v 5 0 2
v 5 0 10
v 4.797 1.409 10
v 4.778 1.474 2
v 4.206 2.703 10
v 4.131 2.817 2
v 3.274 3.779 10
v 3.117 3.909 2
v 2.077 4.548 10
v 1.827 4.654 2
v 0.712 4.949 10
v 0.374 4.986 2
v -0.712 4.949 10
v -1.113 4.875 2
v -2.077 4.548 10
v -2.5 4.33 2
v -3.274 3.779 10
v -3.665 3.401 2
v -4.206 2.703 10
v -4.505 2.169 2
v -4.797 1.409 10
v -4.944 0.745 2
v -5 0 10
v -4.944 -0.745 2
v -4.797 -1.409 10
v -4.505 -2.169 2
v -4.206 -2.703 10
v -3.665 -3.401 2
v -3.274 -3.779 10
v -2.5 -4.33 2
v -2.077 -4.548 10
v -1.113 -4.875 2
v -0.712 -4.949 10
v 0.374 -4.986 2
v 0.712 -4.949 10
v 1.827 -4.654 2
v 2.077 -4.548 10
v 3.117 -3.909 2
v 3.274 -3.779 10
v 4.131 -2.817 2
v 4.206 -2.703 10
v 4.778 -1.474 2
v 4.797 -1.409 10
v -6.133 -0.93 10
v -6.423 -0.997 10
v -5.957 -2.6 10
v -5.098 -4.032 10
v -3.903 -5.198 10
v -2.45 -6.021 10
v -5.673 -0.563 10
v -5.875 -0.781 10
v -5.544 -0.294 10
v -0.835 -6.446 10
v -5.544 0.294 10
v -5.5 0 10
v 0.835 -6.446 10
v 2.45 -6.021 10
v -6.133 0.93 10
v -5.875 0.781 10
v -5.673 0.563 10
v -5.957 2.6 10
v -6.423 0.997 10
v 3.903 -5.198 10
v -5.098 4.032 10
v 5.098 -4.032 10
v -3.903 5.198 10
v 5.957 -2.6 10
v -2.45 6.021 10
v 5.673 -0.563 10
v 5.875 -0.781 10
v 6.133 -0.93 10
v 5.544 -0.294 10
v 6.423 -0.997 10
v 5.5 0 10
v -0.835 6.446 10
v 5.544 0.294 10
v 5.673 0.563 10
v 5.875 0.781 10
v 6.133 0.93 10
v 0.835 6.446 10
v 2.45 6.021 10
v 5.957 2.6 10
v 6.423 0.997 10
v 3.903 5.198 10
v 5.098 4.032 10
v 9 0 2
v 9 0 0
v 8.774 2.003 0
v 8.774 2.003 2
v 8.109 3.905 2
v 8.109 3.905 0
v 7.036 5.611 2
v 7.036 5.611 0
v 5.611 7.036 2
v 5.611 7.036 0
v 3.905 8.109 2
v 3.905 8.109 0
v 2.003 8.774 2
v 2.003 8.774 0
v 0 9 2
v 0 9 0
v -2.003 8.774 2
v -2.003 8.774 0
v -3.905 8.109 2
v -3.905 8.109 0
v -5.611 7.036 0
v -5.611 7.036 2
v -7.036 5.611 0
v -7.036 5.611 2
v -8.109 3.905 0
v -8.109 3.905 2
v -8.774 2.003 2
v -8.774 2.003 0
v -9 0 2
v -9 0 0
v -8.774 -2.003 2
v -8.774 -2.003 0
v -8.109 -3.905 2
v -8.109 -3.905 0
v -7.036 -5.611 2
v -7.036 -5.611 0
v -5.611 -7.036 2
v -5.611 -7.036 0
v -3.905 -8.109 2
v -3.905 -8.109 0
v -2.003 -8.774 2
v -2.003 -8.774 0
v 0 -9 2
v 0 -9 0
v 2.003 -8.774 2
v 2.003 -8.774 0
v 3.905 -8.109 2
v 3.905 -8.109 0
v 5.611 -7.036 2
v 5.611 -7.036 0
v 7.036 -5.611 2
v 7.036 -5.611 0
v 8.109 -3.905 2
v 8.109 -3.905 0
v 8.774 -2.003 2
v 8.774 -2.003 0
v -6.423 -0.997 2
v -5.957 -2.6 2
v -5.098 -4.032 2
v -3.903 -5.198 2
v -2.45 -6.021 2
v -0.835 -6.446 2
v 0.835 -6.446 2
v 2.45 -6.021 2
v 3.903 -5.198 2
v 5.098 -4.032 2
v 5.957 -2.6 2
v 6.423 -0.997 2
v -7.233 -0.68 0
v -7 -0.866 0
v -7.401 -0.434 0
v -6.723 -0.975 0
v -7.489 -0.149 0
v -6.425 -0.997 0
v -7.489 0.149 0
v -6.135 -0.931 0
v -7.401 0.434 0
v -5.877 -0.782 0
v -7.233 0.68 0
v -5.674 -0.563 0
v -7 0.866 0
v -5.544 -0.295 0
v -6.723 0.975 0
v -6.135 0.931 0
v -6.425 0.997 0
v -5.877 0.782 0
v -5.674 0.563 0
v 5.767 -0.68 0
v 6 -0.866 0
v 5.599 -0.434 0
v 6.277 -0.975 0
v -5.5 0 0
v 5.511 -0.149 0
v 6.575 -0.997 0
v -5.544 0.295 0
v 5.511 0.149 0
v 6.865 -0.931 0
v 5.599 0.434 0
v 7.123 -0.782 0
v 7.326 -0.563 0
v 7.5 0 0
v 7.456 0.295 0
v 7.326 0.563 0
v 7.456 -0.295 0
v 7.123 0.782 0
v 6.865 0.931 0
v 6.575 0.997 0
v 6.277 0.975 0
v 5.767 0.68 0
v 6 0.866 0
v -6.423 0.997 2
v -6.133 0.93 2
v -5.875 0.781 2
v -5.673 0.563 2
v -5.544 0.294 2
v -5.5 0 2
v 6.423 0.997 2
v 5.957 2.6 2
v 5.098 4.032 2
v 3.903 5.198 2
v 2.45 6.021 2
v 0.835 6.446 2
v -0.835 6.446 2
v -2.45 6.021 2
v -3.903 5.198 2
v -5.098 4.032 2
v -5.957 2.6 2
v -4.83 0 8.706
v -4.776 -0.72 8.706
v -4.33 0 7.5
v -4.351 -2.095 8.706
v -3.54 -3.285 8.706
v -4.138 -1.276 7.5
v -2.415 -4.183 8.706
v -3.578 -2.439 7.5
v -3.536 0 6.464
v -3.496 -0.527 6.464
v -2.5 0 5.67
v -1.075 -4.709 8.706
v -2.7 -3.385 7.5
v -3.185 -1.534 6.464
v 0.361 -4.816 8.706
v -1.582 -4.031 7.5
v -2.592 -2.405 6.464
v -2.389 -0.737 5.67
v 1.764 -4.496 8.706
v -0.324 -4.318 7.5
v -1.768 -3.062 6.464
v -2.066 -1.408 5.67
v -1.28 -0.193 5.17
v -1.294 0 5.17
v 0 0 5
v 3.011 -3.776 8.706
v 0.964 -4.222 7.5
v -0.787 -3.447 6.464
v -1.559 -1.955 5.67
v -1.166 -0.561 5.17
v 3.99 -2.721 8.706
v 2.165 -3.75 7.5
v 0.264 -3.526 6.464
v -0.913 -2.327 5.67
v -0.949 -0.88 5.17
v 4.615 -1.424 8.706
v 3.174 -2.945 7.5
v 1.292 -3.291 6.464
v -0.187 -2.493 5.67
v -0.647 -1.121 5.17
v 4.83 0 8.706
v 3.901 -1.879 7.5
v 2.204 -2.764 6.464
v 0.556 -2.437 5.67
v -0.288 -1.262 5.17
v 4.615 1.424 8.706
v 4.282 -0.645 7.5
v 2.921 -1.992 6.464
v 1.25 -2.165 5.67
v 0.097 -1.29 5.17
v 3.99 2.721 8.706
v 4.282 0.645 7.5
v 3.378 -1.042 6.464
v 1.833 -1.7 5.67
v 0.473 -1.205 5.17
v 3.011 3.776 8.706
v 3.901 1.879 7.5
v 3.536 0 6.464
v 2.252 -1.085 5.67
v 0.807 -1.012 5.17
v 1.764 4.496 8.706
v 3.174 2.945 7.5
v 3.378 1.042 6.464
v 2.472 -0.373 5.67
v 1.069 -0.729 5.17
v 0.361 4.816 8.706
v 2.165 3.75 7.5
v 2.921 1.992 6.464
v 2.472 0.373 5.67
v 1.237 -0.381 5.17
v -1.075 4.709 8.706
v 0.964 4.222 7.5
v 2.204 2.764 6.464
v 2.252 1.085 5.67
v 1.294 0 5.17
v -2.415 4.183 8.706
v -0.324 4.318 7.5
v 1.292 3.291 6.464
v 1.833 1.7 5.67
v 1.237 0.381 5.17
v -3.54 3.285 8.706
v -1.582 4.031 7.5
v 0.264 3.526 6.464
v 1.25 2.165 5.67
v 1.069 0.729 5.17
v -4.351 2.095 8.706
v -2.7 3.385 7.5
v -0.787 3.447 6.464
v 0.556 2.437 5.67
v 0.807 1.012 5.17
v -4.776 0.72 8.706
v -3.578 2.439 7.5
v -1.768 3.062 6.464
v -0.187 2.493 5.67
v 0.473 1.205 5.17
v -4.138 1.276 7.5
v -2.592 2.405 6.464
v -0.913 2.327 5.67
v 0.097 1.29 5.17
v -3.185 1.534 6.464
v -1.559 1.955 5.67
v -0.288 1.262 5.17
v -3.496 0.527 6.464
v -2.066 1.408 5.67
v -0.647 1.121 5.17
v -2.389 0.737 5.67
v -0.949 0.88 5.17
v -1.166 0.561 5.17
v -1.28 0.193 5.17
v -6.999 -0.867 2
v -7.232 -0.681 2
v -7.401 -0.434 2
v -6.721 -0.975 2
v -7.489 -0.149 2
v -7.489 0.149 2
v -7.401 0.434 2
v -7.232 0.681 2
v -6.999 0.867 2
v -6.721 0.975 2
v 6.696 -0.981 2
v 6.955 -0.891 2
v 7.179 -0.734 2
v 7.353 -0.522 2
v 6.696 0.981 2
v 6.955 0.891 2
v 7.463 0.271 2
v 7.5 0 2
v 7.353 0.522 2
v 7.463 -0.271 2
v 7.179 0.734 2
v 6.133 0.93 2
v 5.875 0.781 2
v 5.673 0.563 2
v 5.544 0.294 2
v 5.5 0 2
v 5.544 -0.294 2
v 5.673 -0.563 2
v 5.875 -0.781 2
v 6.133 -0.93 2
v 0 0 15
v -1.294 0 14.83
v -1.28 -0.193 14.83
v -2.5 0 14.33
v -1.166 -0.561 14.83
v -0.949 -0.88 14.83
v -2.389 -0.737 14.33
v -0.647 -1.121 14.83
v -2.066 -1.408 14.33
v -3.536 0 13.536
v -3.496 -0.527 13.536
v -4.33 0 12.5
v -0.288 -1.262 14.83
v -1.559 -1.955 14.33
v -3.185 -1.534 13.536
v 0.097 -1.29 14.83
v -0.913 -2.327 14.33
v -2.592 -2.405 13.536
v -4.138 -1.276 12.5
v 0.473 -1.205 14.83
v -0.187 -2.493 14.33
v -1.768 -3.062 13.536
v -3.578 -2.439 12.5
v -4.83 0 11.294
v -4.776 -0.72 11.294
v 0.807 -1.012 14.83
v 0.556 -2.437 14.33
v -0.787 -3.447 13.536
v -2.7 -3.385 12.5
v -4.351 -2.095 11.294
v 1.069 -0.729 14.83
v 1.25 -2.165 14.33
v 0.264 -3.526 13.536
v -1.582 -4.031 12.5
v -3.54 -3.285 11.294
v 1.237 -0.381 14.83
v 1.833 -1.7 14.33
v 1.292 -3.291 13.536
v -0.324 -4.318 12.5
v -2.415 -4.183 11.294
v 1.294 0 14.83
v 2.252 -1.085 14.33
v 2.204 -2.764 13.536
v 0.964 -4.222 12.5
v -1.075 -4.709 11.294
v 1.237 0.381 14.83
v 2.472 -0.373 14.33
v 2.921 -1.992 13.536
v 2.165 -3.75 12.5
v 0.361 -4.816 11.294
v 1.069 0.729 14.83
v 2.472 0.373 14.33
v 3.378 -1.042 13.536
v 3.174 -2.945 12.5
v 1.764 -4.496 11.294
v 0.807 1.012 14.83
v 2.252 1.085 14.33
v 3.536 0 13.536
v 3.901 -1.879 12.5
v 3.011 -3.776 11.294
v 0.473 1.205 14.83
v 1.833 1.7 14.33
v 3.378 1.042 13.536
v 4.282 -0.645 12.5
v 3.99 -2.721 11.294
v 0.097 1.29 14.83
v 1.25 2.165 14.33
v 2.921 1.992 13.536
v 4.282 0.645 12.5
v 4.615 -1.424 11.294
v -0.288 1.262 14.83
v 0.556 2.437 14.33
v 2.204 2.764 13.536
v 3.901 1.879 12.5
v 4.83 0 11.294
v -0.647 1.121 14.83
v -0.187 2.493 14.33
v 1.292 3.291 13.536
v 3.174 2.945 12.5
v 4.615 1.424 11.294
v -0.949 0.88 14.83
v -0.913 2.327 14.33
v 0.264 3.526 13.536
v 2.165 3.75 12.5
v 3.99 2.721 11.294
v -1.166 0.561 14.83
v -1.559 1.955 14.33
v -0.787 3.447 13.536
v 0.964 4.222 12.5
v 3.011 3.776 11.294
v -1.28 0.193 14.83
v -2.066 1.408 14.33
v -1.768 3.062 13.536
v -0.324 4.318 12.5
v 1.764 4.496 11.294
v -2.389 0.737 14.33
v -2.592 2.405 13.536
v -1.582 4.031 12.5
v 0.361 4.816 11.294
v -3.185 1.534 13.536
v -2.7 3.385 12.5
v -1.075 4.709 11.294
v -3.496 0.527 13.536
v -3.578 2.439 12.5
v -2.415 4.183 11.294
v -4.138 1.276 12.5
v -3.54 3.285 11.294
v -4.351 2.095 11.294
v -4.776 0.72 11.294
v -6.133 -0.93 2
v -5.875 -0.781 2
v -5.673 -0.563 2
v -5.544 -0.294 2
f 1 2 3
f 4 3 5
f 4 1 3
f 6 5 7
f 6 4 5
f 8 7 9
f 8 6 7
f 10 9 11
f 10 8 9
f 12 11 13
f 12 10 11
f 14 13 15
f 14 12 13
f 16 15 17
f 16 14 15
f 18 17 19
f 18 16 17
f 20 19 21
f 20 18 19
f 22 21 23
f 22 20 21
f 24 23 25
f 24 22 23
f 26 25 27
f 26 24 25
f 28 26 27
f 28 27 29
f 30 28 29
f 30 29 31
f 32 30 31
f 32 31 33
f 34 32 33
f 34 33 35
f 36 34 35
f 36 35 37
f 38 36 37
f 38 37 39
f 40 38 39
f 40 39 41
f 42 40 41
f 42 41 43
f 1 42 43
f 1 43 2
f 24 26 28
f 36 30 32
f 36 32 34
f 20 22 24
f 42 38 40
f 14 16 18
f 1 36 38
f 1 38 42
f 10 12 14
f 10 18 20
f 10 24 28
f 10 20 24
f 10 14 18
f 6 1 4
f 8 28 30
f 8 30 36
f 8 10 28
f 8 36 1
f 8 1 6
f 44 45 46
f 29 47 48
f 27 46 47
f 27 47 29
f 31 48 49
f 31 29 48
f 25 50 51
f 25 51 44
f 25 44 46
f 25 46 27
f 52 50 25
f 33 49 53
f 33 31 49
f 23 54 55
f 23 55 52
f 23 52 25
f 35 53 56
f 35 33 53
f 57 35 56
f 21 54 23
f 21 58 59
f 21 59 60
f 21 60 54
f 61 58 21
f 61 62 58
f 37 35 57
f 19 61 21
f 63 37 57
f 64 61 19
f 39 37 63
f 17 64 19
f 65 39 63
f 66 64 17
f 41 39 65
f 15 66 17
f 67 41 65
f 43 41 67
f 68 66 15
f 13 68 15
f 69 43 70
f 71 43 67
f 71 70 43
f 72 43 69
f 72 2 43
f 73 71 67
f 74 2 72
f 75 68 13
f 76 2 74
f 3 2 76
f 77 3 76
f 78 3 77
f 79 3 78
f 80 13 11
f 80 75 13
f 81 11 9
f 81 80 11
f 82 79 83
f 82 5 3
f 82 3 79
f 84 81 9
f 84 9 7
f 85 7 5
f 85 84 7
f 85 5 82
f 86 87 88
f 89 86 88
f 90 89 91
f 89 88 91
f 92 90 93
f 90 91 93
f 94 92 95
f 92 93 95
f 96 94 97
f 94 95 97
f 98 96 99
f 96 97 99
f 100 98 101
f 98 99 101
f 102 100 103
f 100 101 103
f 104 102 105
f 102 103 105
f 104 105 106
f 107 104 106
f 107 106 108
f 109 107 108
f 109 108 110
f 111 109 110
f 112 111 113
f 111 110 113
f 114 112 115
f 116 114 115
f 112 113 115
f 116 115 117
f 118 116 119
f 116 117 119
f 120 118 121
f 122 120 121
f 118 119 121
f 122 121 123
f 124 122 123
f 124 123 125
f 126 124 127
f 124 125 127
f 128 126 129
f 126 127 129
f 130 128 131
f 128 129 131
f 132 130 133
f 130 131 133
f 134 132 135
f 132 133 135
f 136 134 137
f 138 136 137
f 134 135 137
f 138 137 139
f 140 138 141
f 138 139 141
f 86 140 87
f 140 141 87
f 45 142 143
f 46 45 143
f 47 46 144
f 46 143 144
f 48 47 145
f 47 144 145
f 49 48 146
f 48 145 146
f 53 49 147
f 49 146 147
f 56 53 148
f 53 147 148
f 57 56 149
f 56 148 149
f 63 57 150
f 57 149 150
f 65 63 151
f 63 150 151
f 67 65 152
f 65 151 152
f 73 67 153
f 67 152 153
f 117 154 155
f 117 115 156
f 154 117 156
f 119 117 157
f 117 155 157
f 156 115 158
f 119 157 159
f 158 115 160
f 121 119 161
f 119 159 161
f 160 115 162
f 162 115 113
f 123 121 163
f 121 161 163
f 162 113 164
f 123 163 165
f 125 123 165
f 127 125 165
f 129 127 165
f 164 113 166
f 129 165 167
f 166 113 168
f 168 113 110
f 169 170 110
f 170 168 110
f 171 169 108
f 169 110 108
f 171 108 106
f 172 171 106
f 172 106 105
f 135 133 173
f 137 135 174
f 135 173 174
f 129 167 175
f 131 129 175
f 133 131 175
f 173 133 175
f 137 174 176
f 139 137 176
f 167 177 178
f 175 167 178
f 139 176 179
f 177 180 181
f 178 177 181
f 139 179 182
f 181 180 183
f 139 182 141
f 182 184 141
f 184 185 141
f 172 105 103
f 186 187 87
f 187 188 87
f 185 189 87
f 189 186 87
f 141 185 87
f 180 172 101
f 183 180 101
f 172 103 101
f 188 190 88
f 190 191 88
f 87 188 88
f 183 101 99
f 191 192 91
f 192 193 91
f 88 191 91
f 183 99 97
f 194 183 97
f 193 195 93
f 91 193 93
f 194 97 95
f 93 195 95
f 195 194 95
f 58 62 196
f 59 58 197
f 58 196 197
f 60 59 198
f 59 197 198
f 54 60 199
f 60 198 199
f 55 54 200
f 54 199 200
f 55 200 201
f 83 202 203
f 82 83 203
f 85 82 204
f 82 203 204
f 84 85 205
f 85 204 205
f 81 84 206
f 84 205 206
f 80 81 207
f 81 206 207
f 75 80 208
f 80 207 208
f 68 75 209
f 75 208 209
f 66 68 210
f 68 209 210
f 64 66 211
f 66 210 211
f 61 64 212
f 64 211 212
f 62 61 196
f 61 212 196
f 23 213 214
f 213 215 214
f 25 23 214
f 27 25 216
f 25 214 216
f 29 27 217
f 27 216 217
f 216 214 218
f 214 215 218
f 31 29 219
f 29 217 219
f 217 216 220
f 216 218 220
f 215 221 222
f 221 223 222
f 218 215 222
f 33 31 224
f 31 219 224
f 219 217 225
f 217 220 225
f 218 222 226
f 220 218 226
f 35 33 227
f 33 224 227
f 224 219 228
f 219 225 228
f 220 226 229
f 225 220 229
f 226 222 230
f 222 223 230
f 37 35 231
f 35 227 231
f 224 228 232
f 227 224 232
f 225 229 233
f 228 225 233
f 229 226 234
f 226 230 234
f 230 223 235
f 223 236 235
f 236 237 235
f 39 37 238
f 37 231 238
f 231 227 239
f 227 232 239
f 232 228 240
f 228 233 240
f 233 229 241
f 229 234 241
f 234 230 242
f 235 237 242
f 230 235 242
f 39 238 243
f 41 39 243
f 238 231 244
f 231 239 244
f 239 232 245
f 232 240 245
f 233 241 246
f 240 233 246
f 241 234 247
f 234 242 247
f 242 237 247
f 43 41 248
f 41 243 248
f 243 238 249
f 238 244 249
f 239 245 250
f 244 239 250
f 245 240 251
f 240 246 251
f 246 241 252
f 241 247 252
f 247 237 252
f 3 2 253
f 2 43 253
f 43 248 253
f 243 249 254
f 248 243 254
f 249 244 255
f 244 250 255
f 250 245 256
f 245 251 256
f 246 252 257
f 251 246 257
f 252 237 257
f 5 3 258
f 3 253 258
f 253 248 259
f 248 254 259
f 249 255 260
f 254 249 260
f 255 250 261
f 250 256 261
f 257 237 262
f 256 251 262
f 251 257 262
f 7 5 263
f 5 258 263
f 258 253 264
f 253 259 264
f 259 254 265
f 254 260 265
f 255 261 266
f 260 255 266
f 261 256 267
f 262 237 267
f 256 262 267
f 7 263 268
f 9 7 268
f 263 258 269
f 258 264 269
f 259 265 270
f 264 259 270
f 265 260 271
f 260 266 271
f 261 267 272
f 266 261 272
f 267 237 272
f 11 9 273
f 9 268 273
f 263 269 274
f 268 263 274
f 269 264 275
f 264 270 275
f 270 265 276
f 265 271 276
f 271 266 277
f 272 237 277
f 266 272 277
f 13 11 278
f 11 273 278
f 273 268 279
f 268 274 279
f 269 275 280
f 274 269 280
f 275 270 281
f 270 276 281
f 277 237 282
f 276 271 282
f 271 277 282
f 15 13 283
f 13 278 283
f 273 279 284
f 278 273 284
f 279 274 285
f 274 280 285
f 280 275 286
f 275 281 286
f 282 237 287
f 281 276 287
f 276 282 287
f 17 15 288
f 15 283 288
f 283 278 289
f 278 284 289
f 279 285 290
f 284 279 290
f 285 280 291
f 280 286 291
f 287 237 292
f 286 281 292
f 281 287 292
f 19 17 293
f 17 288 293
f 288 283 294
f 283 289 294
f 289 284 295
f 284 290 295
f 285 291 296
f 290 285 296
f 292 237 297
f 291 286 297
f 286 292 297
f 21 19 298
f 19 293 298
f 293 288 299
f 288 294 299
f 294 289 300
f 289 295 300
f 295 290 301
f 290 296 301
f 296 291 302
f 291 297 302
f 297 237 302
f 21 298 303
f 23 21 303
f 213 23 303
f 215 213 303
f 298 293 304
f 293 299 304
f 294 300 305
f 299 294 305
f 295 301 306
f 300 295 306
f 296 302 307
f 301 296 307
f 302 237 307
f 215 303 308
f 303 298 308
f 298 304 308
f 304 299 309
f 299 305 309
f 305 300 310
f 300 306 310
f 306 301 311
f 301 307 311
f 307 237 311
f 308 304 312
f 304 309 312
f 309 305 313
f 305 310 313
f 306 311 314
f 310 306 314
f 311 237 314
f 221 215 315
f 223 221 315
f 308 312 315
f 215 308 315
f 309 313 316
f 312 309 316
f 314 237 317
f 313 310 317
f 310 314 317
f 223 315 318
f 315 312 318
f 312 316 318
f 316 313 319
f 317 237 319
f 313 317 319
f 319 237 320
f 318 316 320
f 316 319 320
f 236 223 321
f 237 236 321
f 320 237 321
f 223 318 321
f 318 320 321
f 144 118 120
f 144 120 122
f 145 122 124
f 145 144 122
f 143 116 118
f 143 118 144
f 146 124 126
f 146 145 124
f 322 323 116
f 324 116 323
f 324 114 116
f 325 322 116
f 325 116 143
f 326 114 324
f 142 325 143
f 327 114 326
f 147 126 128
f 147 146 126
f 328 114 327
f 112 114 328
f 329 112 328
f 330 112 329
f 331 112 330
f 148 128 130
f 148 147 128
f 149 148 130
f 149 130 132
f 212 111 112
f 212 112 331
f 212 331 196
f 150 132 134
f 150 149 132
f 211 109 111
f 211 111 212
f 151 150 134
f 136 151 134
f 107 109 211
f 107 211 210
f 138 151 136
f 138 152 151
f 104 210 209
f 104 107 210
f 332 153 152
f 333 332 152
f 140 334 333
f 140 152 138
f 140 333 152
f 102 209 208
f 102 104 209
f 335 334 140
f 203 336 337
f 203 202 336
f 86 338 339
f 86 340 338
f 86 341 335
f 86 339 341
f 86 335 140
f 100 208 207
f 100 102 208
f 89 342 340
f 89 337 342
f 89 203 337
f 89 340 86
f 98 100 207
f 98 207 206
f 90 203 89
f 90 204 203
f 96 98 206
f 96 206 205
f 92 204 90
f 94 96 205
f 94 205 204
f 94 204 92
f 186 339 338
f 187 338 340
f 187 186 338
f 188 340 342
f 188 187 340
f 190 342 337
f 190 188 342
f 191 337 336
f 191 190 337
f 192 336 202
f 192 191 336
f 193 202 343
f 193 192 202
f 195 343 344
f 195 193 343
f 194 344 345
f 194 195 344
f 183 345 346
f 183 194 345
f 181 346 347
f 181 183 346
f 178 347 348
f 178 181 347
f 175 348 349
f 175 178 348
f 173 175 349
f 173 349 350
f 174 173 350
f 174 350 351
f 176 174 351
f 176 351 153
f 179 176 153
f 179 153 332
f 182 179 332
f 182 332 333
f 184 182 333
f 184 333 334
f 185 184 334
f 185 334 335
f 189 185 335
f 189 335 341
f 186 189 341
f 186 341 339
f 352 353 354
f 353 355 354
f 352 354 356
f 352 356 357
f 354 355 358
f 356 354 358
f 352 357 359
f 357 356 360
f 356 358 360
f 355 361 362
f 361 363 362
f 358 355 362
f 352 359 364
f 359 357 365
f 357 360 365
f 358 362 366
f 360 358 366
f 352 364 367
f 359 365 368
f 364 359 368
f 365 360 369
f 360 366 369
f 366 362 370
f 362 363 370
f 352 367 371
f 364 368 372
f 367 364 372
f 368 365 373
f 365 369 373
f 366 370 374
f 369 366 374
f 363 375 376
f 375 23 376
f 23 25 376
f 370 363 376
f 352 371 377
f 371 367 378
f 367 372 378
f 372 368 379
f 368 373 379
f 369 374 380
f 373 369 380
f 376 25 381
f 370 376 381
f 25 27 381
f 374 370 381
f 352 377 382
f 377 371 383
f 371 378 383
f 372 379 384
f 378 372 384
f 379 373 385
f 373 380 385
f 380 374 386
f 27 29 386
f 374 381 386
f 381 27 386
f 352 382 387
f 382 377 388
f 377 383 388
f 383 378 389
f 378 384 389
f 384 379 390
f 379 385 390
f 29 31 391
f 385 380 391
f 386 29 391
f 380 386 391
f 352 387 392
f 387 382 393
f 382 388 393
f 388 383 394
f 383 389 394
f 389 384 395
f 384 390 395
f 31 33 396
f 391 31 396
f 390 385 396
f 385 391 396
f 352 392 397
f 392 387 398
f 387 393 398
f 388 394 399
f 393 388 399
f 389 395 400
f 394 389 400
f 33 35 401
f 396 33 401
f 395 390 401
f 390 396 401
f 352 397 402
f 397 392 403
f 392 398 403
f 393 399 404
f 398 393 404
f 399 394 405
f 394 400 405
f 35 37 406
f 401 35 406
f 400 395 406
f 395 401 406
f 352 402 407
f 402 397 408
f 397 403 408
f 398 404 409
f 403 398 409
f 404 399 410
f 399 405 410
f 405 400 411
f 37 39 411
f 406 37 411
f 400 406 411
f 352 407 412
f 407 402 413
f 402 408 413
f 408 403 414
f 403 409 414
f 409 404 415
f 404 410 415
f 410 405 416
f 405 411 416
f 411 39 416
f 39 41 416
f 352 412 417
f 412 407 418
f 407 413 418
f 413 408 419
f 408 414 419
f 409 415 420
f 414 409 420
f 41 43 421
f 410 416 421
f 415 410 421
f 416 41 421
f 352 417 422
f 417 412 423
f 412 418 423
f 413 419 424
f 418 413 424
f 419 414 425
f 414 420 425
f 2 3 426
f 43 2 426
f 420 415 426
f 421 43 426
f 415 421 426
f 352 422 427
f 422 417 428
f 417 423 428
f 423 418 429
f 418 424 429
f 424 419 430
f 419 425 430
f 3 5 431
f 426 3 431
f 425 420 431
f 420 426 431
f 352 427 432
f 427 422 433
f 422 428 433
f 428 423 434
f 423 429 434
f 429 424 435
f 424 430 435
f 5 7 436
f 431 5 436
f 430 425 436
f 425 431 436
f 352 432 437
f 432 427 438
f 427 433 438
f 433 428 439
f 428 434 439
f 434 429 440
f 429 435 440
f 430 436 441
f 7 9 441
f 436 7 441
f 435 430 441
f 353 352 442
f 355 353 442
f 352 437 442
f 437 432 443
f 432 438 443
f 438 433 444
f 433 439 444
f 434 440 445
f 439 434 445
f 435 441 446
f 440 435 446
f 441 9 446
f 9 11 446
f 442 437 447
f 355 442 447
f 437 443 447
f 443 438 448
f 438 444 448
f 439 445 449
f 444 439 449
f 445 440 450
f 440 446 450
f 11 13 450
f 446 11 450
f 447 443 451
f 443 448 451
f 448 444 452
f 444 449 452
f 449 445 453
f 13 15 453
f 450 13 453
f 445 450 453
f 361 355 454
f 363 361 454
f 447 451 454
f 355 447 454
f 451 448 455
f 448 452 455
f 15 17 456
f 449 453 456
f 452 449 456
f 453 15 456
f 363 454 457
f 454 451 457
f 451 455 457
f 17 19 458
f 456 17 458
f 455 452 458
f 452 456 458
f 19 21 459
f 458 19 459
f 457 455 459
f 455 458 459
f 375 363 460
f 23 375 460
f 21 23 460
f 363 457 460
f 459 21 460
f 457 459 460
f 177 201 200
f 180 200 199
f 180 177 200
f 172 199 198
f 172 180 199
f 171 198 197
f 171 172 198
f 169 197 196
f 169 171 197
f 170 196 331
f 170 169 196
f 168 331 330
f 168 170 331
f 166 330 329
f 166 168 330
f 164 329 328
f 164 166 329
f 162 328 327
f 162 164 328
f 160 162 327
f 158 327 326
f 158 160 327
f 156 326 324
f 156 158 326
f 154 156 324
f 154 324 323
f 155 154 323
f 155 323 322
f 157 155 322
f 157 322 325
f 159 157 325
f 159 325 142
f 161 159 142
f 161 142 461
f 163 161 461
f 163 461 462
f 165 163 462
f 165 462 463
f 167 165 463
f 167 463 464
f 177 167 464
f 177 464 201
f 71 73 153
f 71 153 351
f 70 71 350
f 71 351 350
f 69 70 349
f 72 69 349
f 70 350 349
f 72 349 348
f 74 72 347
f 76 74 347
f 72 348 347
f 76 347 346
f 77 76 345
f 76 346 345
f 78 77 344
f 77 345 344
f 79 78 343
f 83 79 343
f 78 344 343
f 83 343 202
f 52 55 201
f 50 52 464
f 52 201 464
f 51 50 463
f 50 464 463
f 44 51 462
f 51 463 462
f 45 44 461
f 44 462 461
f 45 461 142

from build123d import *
from build123d import SkipClean  # not in build123d's __all__

# Parameters (mm, degrees)
F2_R     = 9
F2_R_2   = 1
F3_DEPTH = 2
F6_R     = 5
F7_DEPTH = 8


with BuildPart() as f3:
    # F2 (on Top) → F3 (new body)
    with BuildSketch(Plane.XY):
        Circle(F2_R)
        with Locations((-6.5, 0)):
            Circle(F2_R_2, mode=Mode.SUBTRACT)
        with Locations((6.5, 0)):
            Circle(F2_R_2, mode=Mode.SUBTRACT)
    extrude(amount=F3_DEPTH)



with BuildPart() as f5:
    # F4 (on Front) → F5 (revolve)
    with BuildSketch(Plane.XZ):
        with BuildLine():
            Line((0, 5), (0, 15))
            ThreePointArc((0, 15), (-5, 10), (0, 5))
        make_face()
    revolve(axis=Axis((0, 0, 8.2231094215), (0, 0, 1)))


with BuildPart() as f3_1:
    add(f3.part, clean=False)

    with SkipClean():  # cleaning this boolean's faces spoils the solid; the shape is the same uncleaned
        add(f5.part)  # F7 merges F5
    # F6 (on face) → F7 (join)
    with BuildSketch(Plane.XY.offset(2)):
        with BuildLine():
            ThreePointArc((6.4230769231, -0.9970370305), (5.5, 0), (6.4230769231, 0.9970370305))
            ThreePointArc((6.4230769231, 0.9970370305), (0, 6.5), (-6.4230769231, 0.9970370305))
            ThreePointArc((-6.4230769231, 0.9970370305), (-5.7662006143, 0.6793662205), (-5.5, 0))
            ThreePointArc((-5.5, 0), (-5.7662006143, -0.6793662205), (-6.4230769231, -0.9970370305))
            ThreePointArc((-6.4230769231, -0.9970370305), (0, -6.5), (6.4230769231, -0.9970370305))
        make_face()
        Circle(F6_R, mode=Mode.SUBTRACT)
    with SkipClean():  # cleaning this boolean's faces spoils the solid; the shape is the same uncleaned
        extrude(amount=F7_DEPTH)


solid = f3_1.part
